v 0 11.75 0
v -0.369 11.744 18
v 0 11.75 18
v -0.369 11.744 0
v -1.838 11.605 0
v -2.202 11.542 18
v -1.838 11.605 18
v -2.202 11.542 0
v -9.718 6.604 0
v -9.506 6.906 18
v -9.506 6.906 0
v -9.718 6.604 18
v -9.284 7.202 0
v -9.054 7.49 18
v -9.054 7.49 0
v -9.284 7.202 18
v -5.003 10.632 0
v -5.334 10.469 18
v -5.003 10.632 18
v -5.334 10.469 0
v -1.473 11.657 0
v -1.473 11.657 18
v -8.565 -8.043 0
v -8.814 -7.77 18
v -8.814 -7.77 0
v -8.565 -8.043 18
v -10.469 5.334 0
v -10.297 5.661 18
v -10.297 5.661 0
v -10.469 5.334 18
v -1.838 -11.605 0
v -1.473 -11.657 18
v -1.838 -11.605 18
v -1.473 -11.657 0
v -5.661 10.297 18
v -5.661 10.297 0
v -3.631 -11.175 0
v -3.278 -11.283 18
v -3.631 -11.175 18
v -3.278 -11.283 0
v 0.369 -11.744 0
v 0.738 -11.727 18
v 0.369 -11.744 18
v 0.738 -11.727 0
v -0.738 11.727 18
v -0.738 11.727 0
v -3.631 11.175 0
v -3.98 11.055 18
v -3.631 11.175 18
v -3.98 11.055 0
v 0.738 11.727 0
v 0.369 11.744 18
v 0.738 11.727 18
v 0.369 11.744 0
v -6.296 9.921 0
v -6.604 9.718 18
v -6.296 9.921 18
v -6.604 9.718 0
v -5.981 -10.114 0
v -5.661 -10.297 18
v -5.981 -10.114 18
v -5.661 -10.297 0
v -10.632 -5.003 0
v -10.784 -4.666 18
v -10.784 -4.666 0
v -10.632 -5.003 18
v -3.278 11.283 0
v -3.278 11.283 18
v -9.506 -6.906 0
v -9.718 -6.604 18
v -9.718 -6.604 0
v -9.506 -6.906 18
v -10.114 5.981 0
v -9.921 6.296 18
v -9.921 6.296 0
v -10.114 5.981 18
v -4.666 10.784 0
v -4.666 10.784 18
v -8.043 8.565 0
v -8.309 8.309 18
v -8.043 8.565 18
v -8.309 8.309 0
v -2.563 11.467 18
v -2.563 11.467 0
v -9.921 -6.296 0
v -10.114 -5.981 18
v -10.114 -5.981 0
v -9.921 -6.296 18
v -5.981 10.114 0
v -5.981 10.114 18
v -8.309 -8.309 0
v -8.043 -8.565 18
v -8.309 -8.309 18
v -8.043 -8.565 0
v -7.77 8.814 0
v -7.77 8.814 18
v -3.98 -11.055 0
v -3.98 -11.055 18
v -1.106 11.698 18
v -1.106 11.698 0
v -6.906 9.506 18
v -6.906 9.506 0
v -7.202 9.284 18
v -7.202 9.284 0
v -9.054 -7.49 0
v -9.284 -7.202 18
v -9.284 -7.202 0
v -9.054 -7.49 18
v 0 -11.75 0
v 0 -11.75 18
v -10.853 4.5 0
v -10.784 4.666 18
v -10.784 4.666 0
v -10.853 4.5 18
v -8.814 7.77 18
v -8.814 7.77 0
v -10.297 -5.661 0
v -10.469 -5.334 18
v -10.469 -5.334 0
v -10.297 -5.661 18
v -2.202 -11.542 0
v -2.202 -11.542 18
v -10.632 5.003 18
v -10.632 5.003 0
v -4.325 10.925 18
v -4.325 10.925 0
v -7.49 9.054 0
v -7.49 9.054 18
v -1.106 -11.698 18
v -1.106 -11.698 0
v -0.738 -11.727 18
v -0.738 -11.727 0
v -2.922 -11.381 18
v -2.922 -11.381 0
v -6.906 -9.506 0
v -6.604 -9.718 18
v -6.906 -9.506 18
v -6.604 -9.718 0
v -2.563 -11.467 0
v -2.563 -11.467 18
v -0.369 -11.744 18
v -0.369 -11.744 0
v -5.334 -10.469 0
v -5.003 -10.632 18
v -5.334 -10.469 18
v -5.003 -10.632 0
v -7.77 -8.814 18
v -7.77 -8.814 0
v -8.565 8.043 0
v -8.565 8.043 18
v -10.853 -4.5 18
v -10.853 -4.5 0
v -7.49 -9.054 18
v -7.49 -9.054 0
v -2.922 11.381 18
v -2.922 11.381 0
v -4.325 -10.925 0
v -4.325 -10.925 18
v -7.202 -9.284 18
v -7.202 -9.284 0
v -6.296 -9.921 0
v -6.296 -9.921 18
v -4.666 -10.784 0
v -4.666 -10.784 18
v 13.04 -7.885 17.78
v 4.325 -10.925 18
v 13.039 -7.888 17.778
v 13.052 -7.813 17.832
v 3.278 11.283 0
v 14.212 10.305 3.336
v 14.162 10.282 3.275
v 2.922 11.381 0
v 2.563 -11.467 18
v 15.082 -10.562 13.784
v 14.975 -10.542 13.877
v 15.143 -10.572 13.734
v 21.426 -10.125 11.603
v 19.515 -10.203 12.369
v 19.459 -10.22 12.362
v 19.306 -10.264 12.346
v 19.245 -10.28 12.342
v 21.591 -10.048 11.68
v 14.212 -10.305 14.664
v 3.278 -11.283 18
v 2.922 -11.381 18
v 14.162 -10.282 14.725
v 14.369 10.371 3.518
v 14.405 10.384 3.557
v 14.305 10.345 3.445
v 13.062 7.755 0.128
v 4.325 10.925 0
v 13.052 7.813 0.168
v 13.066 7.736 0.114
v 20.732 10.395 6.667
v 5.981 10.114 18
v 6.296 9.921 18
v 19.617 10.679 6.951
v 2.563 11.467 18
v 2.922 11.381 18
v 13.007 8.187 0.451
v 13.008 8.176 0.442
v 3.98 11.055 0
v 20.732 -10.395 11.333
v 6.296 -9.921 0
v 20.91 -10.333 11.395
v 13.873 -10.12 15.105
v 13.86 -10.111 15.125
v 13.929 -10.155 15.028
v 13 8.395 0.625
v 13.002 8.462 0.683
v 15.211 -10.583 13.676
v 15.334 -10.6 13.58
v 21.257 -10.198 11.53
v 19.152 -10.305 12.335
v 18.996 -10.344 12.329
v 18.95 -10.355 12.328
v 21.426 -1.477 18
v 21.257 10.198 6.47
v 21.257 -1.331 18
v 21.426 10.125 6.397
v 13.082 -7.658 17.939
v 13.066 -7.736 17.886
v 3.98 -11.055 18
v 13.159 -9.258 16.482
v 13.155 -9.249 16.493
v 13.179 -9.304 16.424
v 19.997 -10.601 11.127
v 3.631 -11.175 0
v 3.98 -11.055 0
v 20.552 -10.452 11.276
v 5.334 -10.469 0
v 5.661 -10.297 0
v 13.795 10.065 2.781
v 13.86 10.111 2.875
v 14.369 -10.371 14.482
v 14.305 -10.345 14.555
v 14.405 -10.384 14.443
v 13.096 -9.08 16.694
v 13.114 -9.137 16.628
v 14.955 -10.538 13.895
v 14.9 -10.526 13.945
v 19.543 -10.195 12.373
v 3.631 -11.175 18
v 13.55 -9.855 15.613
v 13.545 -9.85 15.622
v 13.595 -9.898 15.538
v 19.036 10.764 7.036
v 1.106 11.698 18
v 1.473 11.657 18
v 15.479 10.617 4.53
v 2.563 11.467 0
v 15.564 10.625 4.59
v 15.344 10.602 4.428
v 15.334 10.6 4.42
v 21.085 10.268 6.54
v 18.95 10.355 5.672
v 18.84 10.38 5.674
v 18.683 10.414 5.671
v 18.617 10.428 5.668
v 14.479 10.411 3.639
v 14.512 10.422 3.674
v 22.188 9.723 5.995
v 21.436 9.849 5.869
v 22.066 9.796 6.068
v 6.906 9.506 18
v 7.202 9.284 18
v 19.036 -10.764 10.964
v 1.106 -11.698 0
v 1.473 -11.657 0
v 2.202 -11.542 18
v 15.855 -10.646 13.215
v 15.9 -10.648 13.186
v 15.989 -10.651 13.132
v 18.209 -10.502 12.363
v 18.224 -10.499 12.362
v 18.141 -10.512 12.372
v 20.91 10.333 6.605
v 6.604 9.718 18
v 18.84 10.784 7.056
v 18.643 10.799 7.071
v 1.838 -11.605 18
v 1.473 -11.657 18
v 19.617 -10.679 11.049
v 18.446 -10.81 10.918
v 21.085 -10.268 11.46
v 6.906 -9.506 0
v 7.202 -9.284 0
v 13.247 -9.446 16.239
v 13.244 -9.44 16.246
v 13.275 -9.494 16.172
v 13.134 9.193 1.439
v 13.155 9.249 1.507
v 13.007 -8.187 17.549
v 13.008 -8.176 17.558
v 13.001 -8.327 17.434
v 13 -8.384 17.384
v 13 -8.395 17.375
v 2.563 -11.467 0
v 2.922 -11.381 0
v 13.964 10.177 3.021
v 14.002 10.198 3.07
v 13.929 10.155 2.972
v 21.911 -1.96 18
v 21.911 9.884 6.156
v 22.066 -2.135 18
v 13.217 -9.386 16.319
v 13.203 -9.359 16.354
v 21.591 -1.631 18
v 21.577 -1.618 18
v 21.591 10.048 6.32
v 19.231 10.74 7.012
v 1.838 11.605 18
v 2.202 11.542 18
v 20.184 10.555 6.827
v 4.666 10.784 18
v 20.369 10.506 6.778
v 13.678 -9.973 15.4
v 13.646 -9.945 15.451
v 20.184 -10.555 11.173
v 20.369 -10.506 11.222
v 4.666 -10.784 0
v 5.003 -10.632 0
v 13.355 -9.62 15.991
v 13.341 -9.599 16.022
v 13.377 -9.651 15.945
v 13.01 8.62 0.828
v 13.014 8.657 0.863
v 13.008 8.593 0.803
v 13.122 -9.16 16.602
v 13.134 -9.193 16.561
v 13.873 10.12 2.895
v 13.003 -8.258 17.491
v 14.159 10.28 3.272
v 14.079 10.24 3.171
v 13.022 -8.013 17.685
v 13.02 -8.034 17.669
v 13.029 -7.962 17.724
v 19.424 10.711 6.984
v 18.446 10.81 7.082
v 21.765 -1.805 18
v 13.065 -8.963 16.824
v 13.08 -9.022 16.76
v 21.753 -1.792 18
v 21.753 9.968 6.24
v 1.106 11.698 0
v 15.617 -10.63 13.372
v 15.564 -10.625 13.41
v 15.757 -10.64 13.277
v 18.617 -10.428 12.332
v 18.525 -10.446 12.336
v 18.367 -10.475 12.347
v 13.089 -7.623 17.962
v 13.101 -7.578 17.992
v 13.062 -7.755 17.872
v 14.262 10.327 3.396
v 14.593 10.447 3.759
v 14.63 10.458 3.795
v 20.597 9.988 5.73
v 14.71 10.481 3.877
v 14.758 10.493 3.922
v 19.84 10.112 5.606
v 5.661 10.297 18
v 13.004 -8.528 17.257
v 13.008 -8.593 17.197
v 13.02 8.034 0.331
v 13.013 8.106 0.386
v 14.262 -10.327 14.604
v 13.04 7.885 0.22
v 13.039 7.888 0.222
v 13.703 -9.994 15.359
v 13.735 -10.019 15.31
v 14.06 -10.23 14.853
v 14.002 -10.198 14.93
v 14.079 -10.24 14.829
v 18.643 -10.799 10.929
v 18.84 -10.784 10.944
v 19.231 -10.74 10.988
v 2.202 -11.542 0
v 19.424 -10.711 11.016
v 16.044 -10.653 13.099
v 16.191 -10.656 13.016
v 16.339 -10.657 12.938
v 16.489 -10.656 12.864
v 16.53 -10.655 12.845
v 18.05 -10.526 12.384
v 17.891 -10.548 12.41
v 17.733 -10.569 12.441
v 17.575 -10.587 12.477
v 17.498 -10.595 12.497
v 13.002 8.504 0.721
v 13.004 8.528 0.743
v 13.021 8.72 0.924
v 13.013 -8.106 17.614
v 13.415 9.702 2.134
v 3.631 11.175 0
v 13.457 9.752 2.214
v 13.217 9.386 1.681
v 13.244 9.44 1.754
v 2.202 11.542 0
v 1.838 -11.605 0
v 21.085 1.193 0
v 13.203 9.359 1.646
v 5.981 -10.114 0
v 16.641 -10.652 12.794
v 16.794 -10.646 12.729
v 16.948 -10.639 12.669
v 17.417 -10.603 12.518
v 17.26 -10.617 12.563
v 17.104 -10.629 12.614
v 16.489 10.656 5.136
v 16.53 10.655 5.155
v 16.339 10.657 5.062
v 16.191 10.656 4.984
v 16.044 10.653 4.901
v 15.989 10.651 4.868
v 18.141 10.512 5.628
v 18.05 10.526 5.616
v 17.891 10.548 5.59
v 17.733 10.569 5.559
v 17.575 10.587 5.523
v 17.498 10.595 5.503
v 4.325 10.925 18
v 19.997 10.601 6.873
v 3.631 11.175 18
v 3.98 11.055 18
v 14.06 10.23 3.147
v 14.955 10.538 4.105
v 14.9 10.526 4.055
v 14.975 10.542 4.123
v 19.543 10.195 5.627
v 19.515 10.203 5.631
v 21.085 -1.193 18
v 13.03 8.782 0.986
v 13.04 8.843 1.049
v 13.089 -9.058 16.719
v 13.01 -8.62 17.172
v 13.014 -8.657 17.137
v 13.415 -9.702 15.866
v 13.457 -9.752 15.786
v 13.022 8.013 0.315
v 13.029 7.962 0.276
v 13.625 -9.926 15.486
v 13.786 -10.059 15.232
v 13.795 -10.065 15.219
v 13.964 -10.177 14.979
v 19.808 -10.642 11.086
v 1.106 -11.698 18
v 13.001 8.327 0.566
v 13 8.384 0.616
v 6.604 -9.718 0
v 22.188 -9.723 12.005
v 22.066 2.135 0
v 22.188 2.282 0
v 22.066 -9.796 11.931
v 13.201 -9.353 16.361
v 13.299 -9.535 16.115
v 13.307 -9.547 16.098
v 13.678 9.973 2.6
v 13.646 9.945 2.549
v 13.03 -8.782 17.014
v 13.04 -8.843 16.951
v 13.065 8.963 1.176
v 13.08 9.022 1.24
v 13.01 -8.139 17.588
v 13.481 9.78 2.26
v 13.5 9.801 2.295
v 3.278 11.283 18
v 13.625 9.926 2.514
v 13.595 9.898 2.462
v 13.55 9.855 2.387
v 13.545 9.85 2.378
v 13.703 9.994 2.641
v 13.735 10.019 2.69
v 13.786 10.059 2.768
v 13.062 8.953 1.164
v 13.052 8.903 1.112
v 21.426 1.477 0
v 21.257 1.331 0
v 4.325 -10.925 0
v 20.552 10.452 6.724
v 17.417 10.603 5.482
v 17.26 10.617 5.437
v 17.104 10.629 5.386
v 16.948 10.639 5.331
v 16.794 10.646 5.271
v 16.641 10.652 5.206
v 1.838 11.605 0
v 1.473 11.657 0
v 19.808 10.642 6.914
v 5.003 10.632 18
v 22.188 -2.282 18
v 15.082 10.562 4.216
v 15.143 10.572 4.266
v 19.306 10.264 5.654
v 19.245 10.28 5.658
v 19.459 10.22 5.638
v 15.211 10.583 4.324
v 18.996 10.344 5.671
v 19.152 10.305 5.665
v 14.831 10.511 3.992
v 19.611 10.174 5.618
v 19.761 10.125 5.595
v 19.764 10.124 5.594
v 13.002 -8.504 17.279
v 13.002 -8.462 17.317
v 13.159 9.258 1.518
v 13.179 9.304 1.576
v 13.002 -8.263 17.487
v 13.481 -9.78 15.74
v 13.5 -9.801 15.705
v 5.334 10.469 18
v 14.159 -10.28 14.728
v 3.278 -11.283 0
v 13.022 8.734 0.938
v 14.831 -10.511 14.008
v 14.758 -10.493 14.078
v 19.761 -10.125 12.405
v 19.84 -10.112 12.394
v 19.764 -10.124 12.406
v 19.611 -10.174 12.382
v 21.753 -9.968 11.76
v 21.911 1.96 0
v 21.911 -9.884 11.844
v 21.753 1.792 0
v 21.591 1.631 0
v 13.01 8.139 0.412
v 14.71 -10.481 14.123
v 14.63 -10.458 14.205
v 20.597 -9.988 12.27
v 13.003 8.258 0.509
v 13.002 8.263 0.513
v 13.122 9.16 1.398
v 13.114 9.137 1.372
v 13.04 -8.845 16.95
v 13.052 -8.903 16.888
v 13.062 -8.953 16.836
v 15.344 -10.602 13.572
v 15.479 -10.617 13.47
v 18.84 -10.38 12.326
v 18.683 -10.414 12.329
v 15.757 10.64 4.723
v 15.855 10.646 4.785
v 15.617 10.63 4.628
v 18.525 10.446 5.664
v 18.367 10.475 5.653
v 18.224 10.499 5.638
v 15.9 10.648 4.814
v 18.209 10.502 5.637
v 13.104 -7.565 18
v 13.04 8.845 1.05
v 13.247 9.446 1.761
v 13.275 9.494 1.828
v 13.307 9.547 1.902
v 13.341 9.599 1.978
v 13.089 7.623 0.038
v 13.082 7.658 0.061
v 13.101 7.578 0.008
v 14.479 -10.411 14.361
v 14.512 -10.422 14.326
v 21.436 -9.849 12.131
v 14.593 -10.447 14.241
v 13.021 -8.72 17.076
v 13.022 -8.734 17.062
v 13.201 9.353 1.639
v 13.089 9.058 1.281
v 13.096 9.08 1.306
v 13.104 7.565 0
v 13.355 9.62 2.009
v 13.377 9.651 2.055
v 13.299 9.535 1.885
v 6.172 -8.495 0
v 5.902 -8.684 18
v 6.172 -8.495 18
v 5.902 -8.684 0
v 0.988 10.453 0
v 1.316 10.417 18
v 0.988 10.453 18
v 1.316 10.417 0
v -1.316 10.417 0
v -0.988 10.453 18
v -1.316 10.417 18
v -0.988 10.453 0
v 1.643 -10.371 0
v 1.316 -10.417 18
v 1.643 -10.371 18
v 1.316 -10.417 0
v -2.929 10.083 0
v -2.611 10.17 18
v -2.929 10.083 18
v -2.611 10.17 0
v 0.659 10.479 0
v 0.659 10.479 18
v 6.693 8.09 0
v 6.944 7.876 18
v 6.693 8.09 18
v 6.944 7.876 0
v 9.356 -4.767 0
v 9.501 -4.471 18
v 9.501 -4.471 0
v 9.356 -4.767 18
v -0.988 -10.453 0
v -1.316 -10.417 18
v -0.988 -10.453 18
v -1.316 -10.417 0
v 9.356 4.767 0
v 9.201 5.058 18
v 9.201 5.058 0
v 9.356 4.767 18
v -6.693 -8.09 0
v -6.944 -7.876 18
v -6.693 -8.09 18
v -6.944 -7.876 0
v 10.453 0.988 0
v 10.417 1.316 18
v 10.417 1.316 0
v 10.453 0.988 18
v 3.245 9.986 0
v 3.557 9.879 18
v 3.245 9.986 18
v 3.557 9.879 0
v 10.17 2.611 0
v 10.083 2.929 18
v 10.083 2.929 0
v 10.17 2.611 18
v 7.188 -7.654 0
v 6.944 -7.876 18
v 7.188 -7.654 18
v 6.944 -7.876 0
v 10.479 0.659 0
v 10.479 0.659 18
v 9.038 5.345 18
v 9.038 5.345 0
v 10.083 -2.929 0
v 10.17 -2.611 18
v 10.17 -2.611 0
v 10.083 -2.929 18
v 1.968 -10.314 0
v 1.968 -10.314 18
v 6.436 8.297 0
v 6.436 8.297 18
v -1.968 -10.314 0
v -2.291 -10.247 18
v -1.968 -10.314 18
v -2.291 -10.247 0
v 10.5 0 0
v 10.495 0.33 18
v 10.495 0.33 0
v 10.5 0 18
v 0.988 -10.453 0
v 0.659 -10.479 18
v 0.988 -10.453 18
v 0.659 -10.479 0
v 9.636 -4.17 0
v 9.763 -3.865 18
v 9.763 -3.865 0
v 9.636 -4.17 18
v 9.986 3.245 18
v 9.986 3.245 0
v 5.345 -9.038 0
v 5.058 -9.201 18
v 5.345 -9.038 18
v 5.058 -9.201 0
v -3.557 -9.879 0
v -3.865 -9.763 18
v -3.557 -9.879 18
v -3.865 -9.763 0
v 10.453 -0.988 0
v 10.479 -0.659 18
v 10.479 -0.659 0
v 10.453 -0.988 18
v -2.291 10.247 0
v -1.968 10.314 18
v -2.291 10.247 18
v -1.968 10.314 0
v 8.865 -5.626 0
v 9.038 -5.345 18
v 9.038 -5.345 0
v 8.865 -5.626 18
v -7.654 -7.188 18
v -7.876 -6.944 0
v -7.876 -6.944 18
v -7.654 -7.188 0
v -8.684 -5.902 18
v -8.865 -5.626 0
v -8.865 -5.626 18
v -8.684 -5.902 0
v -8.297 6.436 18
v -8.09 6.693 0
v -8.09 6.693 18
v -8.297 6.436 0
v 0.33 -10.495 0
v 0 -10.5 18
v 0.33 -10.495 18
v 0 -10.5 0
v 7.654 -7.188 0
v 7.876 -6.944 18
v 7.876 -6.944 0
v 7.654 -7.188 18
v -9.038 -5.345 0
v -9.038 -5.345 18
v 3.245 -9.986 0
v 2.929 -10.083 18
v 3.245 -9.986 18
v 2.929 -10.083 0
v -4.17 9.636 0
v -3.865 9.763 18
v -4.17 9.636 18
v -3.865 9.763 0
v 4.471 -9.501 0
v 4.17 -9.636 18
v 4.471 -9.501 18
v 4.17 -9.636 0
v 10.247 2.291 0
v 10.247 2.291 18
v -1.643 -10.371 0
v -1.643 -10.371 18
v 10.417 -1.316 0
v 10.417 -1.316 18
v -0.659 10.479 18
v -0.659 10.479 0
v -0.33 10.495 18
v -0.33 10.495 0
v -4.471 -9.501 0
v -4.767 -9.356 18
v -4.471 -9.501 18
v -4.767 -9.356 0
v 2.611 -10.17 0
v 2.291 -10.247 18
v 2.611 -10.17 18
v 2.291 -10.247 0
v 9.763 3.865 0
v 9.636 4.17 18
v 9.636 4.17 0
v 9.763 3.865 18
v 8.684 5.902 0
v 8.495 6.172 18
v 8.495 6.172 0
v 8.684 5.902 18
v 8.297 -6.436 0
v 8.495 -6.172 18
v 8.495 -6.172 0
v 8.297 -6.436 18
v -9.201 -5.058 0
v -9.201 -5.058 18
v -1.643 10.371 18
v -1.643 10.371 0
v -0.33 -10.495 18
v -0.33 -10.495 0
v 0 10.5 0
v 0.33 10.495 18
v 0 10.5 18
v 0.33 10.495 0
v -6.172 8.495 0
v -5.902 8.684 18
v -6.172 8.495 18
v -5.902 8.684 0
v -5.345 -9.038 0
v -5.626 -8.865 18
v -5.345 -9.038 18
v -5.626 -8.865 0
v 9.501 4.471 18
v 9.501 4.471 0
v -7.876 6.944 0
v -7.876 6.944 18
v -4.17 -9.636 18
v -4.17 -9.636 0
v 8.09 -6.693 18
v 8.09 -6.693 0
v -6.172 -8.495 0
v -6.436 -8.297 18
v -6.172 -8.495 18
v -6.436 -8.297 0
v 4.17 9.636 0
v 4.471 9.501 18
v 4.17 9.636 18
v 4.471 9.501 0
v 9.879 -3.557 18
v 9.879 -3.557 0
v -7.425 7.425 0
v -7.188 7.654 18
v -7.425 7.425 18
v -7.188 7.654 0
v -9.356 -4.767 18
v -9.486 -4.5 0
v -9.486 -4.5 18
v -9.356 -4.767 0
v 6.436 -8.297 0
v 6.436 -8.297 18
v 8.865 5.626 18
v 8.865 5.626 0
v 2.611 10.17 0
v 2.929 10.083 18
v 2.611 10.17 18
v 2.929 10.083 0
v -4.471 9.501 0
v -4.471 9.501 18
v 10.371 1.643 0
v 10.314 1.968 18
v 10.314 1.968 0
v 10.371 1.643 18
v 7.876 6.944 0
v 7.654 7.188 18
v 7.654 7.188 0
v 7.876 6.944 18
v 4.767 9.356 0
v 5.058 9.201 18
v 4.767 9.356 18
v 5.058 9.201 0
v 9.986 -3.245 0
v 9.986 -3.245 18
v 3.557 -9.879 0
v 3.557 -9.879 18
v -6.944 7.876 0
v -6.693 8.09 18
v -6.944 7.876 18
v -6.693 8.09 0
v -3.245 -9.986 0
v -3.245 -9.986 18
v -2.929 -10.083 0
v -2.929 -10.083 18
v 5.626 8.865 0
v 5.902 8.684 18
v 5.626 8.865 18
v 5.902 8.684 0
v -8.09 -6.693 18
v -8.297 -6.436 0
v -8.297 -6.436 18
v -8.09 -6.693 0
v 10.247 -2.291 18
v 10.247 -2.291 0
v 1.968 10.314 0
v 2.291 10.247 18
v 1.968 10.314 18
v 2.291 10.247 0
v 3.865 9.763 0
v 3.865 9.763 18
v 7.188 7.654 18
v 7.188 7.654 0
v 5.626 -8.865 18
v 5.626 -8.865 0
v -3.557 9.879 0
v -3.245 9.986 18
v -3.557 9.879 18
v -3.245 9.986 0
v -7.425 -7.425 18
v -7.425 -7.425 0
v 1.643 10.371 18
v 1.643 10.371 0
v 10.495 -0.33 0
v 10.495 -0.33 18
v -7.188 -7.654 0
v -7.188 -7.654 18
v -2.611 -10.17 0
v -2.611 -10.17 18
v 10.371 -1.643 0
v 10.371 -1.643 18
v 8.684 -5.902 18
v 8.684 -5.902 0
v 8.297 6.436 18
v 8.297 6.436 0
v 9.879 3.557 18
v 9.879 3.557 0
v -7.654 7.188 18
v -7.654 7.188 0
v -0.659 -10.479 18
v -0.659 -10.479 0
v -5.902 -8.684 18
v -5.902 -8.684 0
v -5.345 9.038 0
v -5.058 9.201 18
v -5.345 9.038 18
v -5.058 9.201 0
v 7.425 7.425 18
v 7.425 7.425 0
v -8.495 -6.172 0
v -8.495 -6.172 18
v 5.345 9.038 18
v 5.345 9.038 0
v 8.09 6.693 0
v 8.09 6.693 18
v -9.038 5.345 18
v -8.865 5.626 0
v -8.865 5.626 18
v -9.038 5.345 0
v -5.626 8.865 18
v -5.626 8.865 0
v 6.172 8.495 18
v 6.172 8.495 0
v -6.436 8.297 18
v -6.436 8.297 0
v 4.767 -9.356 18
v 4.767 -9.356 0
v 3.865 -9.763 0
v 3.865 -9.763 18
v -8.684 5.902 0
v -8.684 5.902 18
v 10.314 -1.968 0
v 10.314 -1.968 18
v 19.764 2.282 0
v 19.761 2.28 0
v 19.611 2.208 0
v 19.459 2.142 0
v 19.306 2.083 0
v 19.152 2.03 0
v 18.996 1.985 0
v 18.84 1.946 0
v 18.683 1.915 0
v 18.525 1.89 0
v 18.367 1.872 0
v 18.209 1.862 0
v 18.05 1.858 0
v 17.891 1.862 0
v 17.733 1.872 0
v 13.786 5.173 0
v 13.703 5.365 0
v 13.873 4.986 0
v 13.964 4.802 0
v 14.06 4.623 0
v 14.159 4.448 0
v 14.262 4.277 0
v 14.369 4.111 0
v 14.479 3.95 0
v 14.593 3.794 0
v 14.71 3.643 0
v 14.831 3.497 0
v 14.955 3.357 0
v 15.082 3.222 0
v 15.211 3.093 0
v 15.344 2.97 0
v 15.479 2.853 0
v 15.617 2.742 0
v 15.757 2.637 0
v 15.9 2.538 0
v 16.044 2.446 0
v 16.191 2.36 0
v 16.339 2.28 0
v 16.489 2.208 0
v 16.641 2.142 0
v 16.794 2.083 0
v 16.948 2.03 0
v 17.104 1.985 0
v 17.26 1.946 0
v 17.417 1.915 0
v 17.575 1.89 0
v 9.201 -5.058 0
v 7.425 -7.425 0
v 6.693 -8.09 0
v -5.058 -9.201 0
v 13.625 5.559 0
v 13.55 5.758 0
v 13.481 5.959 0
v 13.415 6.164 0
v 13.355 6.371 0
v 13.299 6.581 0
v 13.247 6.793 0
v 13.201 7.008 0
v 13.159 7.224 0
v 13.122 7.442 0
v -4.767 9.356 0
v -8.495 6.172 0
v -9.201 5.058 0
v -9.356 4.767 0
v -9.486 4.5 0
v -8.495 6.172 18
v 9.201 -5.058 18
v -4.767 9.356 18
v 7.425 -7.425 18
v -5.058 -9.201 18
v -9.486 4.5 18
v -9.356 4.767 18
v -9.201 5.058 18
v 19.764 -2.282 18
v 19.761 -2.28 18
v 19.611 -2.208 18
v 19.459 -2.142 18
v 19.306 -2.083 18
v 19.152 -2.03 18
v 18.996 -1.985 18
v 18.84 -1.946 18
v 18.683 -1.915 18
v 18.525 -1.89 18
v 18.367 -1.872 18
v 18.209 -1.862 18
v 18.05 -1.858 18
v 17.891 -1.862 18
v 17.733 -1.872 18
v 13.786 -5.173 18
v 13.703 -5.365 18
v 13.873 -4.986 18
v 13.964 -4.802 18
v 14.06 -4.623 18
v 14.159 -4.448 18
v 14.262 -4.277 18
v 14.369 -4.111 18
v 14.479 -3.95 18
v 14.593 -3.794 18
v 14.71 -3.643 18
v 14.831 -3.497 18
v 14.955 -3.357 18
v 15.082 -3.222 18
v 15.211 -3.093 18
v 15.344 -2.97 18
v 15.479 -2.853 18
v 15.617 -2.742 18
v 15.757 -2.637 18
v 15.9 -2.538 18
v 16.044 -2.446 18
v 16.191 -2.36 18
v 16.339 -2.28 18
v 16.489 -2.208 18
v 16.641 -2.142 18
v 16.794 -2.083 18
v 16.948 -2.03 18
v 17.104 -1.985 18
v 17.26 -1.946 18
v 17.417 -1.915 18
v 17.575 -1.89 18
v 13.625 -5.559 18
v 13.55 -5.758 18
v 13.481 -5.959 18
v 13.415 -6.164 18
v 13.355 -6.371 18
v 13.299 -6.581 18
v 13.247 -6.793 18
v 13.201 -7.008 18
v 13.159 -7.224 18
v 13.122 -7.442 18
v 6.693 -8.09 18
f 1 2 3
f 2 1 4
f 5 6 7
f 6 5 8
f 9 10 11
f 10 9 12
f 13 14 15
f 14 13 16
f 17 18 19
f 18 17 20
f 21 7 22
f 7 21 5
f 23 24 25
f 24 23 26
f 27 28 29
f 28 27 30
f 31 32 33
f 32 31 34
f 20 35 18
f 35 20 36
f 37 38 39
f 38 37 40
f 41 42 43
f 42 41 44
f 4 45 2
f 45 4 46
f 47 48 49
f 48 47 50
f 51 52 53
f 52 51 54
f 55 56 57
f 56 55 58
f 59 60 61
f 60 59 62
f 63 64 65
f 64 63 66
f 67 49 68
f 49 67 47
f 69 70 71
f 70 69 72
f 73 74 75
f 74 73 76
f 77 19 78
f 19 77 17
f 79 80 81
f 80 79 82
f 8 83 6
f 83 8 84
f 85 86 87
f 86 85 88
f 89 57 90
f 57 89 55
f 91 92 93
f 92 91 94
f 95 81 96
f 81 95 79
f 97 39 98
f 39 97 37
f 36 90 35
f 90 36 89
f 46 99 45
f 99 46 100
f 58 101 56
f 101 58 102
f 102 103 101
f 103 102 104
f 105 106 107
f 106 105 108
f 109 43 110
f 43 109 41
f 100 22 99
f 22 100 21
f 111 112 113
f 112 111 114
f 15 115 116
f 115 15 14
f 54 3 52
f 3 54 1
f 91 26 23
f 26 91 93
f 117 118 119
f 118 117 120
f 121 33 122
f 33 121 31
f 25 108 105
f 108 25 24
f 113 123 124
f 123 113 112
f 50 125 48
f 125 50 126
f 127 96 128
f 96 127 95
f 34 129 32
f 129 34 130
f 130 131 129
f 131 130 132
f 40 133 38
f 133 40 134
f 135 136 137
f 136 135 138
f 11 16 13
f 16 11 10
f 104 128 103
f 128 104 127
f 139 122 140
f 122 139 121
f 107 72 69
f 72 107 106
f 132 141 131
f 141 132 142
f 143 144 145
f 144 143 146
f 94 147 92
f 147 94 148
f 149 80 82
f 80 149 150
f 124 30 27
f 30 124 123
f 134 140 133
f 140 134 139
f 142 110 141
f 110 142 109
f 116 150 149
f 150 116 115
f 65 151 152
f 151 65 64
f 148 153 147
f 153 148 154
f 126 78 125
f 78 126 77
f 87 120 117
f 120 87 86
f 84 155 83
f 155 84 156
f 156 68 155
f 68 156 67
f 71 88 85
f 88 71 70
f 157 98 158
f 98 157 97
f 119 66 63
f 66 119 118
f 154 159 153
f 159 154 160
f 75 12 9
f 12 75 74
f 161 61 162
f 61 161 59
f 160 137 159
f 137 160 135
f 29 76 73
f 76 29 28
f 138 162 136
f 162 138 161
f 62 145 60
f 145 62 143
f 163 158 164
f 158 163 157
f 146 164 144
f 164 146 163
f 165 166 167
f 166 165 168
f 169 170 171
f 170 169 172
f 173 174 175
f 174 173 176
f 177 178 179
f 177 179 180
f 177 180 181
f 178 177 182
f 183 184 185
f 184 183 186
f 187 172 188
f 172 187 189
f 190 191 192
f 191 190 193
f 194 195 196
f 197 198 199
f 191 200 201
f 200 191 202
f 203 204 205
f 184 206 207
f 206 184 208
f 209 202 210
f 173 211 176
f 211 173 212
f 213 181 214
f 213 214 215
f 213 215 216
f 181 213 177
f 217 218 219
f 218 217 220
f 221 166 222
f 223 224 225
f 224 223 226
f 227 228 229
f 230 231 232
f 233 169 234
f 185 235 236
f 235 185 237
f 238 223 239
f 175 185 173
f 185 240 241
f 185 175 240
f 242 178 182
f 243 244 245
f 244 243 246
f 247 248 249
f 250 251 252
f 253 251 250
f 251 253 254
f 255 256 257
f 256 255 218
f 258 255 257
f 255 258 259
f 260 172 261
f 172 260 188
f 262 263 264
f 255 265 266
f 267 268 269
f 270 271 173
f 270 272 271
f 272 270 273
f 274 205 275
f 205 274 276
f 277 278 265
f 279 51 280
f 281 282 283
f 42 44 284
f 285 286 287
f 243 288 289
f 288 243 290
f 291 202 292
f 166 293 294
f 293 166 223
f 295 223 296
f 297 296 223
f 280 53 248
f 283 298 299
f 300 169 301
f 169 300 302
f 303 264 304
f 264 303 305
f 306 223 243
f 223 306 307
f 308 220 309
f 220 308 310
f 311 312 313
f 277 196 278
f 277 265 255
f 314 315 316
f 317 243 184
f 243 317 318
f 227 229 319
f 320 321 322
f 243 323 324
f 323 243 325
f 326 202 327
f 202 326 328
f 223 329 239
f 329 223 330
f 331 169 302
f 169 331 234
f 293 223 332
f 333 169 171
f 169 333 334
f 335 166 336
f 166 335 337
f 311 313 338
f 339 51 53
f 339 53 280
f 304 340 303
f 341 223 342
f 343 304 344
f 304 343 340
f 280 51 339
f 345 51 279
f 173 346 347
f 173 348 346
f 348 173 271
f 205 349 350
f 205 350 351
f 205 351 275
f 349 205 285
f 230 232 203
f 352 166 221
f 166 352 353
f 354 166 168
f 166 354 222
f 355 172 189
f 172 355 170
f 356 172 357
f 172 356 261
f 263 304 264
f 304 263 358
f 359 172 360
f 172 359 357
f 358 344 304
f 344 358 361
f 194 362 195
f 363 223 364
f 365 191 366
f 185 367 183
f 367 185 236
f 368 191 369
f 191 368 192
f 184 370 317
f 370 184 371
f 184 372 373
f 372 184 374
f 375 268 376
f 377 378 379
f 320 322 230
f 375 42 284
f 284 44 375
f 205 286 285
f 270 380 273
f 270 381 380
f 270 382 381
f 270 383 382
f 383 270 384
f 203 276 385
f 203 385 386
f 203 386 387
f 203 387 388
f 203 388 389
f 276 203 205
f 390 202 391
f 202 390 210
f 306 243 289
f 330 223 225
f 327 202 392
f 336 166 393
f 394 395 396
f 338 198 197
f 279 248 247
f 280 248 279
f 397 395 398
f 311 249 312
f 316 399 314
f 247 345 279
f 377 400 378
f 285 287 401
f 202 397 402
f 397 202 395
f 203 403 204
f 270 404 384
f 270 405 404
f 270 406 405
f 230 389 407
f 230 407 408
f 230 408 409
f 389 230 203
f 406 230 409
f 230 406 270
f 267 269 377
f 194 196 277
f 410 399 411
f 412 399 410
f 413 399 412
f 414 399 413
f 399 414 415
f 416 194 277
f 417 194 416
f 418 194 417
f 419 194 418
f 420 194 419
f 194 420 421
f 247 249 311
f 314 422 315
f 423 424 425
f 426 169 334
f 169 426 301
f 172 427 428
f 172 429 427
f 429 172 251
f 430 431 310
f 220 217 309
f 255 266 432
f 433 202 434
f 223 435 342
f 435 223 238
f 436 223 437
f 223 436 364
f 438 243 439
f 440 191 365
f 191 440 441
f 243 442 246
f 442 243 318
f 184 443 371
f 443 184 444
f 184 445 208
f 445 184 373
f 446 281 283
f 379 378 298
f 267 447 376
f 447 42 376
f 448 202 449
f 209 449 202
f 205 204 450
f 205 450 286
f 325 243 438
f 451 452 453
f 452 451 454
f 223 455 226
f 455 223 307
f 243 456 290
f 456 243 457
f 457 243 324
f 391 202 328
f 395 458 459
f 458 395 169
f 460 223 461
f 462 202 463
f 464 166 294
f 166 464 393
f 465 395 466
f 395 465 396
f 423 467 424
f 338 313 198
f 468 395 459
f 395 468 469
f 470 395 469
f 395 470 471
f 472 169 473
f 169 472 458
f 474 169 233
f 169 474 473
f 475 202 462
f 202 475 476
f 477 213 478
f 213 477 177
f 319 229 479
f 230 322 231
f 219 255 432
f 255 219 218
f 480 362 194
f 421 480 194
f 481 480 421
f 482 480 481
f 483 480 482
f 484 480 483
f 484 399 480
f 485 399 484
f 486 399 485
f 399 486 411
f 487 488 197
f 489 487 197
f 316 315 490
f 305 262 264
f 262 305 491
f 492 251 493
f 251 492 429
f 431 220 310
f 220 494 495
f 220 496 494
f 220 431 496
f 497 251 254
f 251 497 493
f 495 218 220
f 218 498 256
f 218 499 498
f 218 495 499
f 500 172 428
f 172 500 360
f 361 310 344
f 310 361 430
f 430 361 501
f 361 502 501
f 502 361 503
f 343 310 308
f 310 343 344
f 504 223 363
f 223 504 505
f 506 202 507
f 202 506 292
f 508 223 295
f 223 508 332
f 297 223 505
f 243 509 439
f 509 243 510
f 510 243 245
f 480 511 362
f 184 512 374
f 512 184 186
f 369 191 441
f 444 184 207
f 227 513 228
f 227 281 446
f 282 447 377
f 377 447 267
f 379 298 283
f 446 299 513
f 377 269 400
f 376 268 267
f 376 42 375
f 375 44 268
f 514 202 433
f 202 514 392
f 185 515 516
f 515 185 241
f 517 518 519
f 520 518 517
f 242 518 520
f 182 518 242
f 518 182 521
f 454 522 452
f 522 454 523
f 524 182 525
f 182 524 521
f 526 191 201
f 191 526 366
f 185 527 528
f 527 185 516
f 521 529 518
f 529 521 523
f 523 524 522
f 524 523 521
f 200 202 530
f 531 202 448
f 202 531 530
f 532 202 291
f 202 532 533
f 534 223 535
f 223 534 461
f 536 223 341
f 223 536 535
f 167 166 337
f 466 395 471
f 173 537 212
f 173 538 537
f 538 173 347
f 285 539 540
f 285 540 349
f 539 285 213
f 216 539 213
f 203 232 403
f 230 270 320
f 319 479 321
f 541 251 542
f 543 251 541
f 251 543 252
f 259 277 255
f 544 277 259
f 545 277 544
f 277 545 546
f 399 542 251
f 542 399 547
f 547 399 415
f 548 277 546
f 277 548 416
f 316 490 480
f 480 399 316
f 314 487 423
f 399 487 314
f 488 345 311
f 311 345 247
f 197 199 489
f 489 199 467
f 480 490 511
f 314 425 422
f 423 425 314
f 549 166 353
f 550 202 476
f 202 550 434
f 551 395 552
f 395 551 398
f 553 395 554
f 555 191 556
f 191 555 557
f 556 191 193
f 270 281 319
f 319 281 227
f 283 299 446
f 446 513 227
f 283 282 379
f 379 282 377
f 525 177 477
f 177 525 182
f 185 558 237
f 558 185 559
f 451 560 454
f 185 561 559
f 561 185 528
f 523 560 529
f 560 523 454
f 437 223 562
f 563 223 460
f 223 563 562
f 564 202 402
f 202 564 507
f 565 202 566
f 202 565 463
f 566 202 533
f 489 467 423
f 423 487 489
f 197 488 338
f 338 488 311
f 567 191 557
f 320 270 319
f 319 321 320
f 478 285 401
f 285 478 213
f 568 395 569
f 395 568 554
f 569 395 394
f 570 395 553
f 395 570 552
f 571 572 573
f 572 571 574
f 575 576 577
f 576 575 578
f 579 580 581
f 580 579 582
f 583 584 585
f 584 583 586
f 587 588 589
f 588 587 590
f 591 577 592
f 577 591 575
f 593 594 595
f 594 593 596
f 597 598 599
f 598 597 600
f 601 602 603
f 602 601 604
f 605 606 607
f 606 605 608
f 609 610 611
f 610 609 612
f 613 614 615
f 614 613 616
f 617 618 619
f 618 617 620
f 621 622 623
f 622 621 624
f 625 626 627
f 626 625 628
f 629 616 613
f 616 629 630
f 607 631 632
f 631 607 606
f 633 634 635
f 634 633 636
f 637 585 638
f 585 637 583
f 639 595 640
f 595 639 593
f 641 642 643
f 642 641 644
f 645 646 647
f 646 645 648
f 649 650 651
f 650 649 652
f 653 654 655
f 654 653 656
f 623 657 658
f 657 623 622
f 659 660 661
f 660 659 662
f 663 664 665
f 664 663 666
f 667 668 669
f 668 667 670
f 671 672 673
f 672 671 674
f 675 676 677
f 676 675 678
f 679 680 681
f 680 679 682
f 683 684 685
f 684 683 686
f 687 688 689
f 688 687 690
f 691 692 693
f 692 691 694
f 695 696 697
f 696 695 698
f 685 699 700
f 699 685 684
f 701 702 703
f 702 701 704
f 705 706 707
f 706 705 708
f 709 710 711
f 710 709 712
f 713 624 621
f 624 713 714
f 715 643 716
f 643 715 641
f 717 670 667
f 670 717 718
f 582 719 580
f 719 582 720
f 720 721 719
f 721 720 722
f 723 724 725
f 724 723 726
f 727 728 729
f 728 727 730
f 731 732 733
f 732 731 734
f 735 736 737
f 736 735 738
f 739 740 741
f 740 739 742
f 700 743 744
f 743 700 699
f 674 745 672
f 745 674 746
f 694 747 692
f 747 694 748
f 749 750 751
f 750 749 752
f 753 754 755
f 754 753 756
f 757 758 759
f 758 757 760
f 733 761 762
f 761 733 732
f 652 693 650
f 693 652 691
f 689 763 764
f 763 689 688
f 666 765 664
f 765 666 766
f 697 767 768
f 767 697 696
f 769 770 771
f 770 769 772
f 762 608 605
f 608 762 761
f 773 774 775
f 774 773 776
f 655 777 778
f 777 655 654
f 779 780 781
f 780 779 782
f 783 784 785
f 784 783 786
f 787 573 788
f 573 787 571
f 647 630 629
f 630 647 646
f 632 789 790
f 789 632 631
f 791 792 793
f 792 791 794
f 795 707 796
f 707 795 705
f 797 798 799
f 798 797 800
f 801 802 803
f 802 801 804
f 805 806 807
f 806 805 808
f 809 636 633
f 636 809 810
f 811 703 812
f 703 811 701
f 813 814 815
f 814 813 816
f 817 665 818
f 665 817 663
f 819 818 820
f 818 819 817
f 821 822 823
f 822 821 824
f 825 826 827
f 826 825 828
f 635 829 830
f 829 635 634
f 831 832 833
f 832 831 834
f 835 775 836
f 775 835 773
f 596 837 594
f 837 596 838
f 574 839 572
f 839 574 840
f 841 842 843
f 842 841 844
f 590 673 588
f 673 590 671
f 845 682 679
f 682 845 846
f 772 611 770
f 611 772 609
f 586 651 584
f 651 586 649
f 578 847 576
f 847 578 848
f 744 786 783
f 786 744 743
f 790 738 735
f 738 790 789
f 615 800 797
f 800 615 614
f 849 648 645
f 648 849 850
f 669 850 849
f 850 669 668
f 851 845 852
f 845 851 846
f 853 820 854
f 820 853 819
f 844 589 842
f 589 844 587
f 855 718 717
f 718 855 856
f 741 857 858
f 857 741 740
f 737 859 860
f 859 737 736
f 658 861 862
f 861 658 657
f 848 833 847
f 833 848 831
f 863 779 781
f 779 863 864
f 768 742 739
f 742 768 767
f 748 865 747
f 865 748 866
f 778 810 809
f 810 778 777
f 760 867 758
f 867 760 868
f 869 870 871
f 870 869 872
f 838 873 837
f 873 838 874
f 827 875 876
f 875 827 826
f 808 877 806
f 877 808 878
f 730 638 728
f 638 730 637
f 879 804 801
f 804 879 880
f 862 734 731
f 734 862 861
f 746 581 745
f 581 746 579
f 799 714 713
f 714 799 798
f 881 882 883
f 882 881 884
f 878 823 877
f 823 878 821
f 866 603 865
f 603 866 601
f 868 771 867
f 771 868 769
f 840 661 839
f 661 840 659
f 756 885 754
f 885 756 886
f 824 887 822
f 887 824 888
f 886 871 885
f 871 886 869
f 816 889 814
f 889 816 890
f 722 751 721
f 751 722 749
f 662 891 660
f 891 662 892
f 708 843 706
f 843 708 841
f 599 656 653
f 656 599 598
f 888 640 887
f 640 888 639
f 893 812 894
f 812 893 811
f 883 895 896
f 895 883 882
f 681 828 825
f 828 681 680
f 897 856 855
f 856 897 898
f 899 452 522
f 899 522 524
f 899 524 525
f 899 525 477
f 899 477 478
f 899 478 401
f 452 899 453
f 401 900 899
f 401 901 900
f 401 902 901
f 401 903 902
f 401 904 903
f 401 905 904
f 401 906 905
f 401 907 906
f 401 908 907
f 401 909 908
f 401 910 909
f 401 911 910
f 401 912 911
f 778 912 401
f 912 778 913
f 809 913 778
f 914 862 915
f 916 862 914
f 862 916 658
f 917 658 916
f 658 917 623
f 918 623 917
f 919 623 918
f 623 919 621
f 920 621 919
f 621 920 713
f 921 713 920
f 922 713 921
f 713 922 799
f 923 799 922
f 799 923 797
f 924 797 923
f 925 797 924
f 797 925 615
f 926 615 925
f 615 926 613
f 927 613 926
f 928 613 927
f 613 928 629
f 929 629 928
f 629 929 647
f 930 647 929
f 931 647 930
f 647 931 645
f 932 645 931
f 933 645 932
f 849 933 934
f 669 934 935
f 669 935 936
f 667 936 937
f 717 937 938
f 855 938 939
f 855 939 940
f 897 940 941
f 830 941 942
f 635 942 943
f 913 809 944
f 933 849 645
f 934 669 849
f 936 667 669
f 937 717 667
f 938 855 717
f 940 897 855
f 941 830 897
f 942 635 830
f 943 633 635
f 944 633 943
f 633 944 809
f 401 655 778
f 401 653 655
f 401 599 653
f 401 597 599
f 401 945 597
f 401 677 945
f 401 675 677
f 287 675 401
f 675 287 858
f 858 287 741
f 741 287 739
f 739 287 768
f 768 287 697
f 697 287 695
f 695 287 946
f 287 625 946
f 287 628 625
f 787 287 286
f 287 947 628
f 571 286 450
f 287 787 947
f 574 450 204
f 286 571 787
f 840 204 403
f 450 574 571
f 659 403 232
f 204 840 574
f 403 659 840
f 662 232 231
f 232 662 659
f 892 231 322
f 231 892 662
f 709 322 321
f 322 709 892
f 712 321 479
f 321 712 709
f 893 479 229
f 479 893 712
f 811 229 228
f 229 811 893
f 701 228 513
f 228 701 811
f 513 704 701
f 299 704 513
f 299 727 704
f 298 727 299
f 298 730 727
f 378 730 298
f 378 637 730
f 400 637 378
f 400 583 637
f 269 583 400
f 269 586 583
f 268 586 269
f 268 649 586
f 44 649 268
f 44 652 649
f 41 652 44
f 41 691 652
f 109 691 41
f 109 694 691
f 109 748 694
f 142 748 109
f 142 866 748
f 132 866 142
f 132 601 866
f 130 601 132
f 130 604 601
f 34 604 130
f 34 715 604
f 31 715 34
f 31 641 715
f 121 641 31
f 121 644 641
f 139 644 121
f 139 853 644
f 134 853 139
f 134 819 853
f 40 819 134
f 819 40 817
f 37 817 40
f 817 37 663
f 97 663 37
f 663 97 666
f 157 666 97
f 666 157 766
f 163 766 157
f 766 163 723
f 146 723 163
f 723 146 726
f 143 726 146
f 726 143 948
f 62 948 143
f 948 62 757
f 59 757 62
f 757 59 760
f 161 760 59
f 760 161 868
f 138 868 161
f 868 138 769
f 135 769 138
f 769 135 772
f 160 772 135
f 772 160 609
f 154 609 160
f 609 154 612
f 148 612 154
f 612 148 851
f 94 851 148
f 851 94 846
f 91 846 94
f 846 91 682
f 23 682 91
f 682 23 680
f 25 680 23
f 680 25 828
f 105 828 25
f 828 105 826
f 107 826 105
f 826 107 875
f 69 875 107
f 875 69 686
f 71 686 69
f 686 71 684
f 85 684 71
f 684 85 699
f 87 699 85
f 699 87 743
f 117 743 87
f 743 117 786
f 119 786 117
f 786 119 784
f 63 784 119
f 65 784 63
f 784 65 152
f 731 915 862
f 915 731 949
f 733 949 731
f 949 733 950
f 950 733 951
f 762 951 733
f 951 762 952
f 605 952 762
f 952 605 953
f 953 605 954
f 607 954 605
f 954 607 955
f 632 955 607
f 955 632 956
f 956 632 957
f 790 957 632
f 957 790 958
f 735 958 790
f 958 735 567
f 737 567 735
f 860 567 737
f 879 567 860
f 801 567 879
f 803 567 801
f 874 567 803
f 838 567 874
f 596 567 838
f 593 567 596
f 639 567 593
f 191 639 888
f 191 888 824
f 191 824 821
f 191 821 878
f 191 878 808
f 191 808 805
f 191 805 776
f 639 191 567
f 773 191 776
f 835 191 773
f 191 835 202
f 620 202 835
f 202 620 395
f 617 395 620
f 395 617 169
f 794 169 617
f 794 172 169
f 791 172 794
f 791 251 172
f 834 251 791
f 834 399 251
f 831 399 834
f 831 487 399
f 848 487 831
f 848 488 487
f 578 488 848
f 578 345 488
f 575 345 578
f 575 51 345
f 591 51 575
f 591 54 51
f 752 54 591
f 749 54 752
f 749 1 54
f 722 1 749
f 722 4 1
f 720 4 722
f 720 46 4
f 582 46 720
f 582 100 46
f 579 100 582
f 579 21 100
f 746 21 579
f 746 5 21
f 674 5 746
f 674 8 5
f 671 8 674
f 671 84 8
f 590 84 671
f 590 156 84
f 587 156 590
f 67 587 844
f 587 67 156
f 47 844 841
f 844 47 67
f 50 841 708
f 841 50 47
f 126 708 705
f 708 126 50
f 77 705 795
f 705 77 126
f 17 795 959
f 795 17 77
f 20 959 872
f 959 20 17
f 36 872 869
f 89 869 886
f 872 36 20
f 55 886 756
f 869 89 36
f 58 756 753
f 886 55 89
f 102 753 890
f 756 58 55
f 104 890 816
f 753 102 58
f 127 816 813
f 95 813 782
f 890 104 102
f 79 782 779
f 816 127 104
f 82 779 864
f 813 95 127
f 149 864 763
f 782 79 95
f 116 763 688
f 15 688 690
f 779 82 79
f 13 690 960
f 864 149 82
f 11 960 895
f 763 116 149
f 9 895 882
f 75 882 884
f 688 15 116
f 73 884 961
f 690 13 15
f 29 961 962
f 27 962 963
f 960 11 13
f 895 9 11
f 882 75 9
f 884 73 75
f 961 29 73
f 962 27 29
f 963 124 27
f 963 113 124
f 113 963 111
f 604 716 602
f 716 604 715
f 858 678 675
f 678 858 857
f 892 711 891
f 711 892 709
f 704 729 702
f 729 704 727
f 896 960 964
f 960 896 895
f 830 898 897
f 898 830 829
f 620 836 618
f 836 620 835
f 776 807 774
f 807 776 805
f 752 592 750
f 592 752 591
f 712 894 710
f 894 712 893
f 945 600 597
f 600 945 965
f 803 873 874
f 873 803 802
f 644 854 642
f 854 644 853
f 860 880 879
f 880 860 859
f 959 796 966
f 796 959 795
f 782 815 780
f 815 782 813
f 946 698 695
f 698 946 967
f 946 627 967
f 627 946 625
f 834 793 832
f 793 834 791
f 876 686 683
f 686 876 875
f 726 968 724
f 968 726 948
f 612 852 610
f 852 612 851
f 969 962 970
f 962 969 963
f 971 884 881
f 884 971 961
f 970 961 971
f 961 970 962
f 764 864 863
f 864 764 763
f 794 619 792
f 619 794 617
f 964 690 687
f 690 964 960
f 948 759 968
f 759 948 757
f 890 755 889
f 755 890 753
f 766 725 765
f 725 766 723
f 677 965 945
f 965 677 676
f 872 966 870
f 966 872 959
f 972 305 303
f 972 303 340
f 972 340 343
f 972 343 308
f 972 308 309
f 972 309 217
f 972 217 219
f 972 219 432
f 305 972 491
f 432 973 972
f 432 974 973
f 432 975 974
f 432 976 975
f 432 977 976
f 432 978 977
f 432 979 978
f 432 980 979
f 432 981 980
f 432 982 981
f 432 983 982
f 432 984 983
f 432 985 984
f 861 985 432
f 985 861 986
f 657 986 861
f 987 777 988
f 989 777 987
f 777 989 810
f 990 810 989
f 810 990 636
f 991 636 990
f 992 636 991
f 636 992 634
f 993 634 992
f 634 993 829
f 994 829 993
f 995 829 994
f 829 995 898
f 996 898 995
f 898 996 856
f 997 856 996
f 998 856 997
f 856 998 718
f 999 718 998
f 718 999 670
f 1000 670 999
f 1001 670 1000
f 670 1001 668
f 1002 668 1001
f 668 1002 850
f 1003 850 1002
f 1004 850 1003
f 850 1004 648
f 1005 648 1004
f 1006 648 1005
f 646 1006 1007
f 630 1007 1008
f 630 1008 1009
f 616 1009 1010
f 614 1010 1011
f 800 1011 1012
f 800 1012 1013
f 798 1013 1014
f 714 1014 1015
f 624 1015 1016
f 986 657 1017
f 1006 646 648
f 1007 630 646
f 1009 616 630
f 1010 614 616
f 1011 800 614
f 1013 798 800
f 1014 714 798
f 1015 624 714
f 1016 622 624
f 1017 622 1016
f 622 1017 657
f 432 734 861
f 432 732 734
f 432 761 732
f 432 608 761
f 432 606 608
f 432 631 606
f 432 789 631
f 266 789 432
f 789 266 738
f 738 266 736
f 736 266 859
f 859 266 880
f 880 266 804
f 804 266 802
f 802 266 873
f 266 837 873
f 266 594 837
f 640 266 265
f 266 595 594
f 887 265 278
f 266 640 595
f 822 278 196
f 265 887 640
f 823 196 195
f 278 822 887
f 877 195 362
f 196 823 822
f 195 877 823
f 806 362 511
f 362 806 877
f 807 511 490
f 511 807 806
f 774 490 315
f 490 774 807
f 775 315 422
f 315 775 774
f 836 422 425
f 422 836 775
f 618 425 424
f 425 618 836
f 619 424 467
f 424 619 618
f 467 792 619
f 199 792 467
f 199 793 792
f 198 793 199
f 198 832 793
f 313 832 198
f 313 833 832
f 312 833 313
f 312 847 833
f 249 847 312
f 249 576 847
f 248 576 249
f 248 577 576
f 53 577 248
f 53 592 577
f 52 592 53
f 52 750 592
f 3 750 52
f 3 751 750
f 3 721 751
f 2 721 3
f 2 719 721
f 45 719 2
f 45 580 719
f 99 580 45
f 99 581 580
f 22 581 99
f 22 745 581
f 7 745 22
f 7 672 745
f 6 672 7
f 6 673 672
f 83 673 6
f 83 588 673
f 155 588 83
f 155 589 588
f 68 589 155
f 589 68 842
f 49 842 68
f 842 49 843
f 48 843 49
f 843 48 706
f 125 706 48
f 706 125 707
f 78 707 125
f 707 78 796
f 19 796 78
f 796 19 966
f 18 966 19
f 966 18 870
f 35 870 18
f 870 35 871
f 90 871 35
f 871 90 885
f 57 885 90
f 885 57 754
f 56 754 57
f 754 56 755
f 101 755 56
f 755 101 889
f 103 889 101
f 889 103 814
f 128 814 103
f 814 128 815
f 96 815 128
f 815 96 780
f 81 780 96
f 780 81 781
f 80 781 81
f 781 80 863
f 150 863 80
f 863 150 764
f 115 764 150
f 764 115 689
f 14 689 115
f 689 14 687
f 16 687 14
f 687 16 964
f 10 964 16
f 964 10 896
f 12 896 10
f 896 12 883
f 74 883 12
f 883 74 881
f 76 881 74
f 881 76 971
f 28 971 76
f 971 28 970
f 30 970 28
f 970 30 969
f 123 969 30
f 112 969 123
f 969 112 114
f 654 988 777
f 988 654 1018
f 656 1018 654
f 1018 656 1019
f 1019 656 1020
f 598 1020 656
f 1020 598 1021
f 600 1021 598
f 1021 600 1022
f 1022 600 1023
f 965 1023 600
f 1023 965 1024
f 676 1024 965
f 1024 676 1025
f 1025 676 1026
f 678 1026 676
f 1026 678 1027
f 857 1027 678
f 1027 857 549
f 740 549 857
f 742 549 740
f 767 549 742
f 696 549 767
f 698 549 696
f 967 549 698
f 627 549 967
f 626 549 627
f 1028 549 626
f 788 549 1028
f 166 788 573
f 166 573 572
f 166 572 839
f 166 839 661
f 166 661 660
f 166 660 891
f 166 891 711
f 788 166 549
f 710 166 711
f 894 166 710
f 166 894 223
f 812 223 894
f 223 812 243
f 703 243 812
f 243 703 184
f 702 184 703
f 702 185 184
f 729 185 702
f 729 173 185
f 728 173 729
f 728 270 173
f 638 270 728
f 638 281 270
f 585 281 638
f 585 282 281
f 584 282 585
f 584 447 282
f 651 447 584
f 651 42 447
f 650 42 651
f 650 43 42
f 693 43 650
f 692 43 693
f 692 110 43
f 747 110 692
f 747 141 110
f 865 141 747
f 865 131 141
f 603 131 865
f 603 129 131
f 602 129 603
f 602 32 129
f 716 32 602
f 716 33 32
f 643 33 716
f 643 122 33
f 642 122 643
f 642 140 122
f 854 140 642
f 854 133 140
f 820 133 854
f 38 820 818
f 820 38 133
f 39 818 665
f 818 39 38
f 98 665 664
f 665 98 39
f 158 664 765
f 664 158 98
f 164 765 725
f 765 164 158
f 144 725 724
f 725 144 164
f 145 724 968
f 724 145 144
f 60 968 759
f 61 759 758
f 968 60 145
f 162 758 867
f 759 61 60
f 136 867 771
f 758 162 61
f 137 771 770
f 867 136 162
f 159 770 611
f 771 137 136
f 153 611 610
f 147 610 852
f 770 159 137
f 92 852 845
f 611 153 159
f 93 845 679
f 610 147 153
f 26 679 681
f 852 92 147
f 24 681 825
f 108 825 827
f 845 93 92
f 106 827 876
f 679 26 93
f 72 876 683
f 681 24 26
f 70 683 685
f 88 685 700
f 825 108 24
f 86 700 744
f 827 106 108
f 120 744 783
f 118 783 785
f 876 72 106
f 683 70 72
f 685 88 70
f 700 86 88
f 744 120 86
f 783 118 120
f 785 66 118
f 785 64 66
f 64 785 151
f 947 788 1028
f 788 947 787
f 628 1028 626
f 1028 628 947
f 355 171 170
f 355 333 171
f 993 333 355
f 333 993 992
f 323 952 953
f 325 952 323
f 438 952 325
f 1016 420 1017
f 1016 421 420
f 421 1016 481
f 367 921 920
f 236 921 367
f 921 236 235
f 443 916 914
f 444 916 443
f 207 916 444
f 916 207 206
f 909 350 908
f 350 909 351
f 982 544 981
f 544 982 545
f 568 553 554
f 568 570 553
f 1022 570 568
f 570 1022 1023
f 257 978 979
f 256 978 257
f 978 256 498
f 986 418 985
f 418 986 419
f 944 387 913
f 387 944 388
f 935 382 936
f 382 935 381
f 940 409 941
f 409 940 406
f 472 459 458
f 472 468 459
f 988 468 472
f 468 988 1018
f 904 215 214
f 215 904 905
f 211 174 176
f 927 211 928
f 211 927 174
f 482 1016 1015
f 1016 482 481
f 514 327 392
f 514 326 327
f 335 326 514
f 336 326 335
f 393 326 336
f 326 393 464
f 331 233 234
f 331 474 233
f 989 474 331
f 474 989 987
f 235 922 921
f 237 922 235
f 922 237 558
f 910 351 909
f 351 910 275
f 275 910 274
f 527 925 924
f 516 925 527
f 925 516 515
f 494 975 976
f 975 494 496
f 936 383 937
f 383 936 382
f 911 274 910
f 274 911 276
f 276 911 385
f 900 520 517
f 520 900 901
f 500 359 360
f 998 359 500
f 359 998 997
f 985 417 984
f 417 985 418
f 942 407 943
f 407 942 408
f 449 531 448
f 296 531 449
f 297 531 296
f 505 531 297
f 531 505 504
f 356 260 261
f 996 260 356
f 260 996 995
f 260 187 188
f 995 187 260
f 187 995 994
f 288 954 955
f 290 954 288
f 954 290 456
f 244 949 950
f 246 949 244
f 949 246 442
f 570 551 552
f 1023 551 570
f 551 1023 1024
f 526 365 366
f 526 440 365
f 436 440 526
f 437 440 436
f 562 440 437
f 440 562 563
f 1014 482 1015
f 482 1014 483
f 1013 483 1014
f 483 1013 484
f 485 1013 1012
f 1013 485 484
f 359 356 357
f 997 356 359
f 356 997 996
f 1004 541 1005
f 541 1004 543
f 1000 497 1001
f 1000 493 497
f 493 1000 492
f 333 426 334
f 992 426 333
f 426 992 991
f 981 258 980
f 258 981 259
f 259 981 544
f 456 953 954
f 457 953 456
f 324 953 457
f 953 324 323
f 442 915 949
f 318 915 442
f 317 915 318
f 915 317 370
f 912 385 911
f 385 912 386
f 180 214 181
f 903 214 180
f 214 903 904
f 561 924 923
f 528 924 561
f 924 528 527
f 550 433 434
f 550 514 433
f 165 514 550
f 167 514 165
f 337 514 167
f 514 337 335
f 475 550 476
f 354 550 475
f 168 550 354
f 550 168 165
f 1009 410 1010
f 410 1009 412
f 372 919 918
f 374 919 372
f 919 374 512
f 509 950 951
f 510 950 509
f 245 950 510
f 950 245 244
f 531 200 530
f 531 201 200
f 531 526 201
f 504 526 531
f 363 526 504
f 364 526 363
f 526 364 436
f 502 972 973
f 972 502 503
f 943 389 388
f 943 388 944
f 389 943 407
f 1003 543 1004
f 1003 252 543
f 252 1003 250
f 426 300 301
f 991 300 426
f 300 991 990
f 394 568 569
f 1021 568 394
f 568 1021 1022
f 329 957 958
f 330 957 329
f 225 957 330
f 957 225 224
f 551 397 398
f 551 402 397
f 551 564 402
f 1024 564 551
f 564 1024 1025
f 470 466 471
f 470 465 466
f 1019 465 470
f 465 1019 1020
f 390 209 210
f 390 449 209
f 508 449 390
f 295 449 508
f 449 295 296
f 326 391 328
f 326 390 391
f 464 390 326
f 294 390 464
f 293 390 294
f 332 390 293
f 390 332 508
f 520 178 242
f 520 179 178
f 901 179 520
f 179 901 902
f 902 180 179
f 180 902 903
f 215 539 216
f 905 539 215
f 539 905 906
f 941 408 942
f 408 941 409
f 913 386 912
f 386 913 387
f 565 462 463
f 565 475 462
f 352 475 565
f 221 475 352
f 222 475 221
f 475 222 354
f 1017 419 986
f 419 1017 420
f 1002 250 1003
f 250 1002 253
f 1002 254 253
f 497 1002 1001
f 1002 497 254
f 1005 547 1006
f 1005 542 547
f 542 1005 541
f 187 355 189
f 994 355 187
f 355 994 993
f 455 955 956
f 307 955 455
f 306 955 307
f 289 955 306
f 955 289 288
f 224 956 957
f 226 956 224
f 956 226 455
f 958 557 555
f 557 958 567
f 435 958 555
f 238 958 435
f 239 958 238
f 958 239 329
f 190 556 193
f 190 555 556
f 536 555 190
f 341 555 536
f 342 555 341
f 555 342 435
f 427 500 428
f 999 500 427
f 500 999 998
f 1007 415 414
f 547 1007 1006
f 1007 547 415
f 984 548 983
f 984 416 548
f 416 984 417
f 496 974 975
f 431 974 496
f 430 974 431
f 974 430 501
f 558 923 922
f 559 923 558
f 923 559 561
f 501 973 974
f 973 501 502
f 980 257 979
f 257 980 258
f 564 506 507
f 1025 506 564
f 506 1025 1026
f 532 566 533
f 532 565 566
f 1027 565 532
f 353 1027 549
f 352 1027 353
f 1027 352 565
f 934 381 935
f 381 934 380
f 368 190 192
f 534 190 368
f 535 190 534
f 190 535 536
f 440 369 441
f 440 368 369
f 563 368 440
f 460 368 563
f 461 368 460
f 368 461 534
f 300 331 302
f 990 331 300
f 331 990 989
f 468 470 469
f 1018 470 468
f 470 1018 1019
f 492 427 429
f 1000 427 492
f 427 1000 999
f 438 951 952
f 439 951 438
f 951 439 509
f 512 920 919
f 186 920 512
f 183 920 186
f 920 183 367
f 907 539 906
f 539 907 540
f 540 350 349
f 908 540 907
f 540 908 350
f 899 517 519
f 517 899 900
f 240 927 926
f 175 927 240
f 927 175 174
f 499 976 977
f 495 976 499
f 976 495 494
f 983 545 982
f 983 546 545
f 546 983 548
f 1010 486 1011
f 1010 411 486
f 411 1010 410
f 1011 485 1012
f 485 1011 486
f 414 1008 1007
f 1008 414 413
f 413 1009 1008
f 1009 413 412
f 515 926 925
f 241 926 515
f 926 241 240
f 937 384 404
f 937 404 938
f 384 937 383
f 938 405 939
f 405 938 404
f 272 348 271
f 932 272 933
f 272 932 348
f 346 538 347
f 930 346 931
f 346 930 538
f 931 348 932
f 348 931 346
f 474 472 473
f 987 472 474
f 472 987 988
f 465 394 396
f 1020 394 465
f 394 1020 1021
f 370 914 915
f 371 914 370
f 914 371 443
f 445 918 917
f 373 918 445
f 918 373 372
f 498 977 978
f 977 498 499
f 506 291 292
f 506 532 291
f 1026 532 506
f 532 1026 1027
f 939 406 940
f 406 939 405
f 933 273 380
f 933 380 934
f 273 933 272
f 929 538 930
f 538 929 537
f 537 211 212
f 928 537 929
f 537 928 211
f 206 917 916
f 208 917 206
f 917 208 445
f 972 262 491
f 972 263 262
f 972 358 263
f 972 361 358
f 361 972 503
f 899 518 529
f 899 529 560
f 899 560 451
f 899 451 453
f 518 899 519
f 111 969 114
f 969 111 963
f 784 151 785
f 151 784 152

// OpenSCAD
/////////////////////////////////////////////////////////////////
//Remix by W. Englert 12/02/2018/////////////////////////////////
//Finger_Pen_Holder_V2.0_OpenSCAD////////////////////////////////
//Maker's Making Change /////////////////////////////////////////
//http://www.makersmakingchange.com//////////////////////////////
//Remix of Finger Pen Holder (Vertical) by makersmakingchange////
//Published on February 28, 2018/////////////////////////////////
//www.thingiverse.com/thing:2802074//////////////////////////////
 
 
/*[variables]*/
 
//Length of the Ring
Ring_L = 18.0; // [10:0.5:40]
 
//Ring hole size (mm)
Ring_HD = 21.0; // [10:0.5:40]
 
//Ring Edge Cutout (mm)
Ring_C =9.0; // [0:0.5:40]
 
//Thickness of the Ring (mm)
Ring_T = 2.5; // [2:0.1:4]
 
//Length of the pen holder (mm)
Pen_L = 18; // [10:0.5:40]
 
//Pen hole size (mm)
Pen_HD = 10.1; // [1:0.1:40]
 
//Pen Edge Cutout
Pen_C = 9.5; // [0:0.1:40]
 
//Thickness of Pen holder
Pen_T = 2.5; // [2:0.1:4]
 
//Angle of Pen holder (degrees)
Pen_A =45; // [0:1:359]
 
//Additional distance from ring to pen
Distance = 0;// [0:0.5:40]
 
/*[Hidden]*/
//Total width for top and bottom trimming
Total_W = Ring_HD+(Ring_T*2)+(Pen_HD*2)+(Pen_T*2)+(Distance*2);
 
//facet Number
$fn=200;
 
 
//////////////////////////////////////////////////////////
//////////////////////////////////////////////////////////
//Renders
difference(){
Outer_Structure();
holes();
}
 
 
//////////////////////////////////////////////////////////
//////////////////////////////////////////////////////////
 
//modules
 
module Outer_Structure (){
//Ring Outer
    cylinder(d1=Ring_T+Ring_HD,d2=Ring_T+Ring_HD, h=Ring_L);
 
//Ring and Pen outer structure    
hull(){
//hull attachment point on the ring
    cylinder(d1=Ring_T+Ring_HD,d2=Ring_T+Ring_HD, h=Pen_L);
 
// Pen holder Outer    
    translate([(Ring_HD*0.5)+(Pen_HD*0.5)+(Ring_T*0.5)+(Pen_T*0.5)+Distance,0,(Pen_L*.5)])rotate([Pen_A,0,0]){
    cylinder(d1=Pen_HD + Pen_T,d2=Pen_HD + Pen_T,h=Pen_L, center=true);}
}
}
module holes(){
// Ring Hole
    cylinder(d1=Ring_HD, d2=Ring_HD, h=Ring_L);
    
// Pen Hole    
    translate([(Ring_HD*0.5)+(Pen_HD*0.5)+(Ring_T*0.5)+(Pen_T*0.5)+Distance,0,(Pen_L*.5)])rotate([Pen_A,0,0]){
    cylinder(d1=Pen_HD,d2=Pen_HD,h=Pen_L*2, center=true);}
 
// Cutout for Pen Hole   
    translate([(Ring_HD*0.5)+(Pen_HD)+(Ring_T*0.5)+(Pen_T*0.5)+Distance,0,Pen_L*.5])rotate([Pen_A,0,0]){
    cube([Pen_HD,Pen_C,Pen_L*2],center=true);}
 
// Cutout for Ring Hole    
    translate([-Ring_HD,-Ring_C*.5,0])cube([Ring_HD,Ring_C,Ring_L]);
 
// Trim Bottom of device Flush with Table    
    translate([0,0,-Ring_L])cylinder(d1=Total_W,d2=Total_W,h=Ring_L);
 
// Trim Top of device Flush    
    translate([0,0,Ring_L])cylinder(d1=Total_W,d2=Total_W,h=Ring_L);
}
 
/////////////////////////////////////////////////////////////////
//Remix by W. Englert 12/02/2018/////////////////////////////////
//Finger_Pen_Holder_V2.0_OpenSCAD////////////////////////////////
//Maker's Making Change /////////////////////////////////////////
//http://www.makersmakingchange.com//////////////////////////////
//Remix of Finger Pen Holder (Vertical) by makersmakingchange////
//Published on February 28, 2018/////////////////////////////////
//www.thingiverse.com/thing:2802074//////////////////////////////
